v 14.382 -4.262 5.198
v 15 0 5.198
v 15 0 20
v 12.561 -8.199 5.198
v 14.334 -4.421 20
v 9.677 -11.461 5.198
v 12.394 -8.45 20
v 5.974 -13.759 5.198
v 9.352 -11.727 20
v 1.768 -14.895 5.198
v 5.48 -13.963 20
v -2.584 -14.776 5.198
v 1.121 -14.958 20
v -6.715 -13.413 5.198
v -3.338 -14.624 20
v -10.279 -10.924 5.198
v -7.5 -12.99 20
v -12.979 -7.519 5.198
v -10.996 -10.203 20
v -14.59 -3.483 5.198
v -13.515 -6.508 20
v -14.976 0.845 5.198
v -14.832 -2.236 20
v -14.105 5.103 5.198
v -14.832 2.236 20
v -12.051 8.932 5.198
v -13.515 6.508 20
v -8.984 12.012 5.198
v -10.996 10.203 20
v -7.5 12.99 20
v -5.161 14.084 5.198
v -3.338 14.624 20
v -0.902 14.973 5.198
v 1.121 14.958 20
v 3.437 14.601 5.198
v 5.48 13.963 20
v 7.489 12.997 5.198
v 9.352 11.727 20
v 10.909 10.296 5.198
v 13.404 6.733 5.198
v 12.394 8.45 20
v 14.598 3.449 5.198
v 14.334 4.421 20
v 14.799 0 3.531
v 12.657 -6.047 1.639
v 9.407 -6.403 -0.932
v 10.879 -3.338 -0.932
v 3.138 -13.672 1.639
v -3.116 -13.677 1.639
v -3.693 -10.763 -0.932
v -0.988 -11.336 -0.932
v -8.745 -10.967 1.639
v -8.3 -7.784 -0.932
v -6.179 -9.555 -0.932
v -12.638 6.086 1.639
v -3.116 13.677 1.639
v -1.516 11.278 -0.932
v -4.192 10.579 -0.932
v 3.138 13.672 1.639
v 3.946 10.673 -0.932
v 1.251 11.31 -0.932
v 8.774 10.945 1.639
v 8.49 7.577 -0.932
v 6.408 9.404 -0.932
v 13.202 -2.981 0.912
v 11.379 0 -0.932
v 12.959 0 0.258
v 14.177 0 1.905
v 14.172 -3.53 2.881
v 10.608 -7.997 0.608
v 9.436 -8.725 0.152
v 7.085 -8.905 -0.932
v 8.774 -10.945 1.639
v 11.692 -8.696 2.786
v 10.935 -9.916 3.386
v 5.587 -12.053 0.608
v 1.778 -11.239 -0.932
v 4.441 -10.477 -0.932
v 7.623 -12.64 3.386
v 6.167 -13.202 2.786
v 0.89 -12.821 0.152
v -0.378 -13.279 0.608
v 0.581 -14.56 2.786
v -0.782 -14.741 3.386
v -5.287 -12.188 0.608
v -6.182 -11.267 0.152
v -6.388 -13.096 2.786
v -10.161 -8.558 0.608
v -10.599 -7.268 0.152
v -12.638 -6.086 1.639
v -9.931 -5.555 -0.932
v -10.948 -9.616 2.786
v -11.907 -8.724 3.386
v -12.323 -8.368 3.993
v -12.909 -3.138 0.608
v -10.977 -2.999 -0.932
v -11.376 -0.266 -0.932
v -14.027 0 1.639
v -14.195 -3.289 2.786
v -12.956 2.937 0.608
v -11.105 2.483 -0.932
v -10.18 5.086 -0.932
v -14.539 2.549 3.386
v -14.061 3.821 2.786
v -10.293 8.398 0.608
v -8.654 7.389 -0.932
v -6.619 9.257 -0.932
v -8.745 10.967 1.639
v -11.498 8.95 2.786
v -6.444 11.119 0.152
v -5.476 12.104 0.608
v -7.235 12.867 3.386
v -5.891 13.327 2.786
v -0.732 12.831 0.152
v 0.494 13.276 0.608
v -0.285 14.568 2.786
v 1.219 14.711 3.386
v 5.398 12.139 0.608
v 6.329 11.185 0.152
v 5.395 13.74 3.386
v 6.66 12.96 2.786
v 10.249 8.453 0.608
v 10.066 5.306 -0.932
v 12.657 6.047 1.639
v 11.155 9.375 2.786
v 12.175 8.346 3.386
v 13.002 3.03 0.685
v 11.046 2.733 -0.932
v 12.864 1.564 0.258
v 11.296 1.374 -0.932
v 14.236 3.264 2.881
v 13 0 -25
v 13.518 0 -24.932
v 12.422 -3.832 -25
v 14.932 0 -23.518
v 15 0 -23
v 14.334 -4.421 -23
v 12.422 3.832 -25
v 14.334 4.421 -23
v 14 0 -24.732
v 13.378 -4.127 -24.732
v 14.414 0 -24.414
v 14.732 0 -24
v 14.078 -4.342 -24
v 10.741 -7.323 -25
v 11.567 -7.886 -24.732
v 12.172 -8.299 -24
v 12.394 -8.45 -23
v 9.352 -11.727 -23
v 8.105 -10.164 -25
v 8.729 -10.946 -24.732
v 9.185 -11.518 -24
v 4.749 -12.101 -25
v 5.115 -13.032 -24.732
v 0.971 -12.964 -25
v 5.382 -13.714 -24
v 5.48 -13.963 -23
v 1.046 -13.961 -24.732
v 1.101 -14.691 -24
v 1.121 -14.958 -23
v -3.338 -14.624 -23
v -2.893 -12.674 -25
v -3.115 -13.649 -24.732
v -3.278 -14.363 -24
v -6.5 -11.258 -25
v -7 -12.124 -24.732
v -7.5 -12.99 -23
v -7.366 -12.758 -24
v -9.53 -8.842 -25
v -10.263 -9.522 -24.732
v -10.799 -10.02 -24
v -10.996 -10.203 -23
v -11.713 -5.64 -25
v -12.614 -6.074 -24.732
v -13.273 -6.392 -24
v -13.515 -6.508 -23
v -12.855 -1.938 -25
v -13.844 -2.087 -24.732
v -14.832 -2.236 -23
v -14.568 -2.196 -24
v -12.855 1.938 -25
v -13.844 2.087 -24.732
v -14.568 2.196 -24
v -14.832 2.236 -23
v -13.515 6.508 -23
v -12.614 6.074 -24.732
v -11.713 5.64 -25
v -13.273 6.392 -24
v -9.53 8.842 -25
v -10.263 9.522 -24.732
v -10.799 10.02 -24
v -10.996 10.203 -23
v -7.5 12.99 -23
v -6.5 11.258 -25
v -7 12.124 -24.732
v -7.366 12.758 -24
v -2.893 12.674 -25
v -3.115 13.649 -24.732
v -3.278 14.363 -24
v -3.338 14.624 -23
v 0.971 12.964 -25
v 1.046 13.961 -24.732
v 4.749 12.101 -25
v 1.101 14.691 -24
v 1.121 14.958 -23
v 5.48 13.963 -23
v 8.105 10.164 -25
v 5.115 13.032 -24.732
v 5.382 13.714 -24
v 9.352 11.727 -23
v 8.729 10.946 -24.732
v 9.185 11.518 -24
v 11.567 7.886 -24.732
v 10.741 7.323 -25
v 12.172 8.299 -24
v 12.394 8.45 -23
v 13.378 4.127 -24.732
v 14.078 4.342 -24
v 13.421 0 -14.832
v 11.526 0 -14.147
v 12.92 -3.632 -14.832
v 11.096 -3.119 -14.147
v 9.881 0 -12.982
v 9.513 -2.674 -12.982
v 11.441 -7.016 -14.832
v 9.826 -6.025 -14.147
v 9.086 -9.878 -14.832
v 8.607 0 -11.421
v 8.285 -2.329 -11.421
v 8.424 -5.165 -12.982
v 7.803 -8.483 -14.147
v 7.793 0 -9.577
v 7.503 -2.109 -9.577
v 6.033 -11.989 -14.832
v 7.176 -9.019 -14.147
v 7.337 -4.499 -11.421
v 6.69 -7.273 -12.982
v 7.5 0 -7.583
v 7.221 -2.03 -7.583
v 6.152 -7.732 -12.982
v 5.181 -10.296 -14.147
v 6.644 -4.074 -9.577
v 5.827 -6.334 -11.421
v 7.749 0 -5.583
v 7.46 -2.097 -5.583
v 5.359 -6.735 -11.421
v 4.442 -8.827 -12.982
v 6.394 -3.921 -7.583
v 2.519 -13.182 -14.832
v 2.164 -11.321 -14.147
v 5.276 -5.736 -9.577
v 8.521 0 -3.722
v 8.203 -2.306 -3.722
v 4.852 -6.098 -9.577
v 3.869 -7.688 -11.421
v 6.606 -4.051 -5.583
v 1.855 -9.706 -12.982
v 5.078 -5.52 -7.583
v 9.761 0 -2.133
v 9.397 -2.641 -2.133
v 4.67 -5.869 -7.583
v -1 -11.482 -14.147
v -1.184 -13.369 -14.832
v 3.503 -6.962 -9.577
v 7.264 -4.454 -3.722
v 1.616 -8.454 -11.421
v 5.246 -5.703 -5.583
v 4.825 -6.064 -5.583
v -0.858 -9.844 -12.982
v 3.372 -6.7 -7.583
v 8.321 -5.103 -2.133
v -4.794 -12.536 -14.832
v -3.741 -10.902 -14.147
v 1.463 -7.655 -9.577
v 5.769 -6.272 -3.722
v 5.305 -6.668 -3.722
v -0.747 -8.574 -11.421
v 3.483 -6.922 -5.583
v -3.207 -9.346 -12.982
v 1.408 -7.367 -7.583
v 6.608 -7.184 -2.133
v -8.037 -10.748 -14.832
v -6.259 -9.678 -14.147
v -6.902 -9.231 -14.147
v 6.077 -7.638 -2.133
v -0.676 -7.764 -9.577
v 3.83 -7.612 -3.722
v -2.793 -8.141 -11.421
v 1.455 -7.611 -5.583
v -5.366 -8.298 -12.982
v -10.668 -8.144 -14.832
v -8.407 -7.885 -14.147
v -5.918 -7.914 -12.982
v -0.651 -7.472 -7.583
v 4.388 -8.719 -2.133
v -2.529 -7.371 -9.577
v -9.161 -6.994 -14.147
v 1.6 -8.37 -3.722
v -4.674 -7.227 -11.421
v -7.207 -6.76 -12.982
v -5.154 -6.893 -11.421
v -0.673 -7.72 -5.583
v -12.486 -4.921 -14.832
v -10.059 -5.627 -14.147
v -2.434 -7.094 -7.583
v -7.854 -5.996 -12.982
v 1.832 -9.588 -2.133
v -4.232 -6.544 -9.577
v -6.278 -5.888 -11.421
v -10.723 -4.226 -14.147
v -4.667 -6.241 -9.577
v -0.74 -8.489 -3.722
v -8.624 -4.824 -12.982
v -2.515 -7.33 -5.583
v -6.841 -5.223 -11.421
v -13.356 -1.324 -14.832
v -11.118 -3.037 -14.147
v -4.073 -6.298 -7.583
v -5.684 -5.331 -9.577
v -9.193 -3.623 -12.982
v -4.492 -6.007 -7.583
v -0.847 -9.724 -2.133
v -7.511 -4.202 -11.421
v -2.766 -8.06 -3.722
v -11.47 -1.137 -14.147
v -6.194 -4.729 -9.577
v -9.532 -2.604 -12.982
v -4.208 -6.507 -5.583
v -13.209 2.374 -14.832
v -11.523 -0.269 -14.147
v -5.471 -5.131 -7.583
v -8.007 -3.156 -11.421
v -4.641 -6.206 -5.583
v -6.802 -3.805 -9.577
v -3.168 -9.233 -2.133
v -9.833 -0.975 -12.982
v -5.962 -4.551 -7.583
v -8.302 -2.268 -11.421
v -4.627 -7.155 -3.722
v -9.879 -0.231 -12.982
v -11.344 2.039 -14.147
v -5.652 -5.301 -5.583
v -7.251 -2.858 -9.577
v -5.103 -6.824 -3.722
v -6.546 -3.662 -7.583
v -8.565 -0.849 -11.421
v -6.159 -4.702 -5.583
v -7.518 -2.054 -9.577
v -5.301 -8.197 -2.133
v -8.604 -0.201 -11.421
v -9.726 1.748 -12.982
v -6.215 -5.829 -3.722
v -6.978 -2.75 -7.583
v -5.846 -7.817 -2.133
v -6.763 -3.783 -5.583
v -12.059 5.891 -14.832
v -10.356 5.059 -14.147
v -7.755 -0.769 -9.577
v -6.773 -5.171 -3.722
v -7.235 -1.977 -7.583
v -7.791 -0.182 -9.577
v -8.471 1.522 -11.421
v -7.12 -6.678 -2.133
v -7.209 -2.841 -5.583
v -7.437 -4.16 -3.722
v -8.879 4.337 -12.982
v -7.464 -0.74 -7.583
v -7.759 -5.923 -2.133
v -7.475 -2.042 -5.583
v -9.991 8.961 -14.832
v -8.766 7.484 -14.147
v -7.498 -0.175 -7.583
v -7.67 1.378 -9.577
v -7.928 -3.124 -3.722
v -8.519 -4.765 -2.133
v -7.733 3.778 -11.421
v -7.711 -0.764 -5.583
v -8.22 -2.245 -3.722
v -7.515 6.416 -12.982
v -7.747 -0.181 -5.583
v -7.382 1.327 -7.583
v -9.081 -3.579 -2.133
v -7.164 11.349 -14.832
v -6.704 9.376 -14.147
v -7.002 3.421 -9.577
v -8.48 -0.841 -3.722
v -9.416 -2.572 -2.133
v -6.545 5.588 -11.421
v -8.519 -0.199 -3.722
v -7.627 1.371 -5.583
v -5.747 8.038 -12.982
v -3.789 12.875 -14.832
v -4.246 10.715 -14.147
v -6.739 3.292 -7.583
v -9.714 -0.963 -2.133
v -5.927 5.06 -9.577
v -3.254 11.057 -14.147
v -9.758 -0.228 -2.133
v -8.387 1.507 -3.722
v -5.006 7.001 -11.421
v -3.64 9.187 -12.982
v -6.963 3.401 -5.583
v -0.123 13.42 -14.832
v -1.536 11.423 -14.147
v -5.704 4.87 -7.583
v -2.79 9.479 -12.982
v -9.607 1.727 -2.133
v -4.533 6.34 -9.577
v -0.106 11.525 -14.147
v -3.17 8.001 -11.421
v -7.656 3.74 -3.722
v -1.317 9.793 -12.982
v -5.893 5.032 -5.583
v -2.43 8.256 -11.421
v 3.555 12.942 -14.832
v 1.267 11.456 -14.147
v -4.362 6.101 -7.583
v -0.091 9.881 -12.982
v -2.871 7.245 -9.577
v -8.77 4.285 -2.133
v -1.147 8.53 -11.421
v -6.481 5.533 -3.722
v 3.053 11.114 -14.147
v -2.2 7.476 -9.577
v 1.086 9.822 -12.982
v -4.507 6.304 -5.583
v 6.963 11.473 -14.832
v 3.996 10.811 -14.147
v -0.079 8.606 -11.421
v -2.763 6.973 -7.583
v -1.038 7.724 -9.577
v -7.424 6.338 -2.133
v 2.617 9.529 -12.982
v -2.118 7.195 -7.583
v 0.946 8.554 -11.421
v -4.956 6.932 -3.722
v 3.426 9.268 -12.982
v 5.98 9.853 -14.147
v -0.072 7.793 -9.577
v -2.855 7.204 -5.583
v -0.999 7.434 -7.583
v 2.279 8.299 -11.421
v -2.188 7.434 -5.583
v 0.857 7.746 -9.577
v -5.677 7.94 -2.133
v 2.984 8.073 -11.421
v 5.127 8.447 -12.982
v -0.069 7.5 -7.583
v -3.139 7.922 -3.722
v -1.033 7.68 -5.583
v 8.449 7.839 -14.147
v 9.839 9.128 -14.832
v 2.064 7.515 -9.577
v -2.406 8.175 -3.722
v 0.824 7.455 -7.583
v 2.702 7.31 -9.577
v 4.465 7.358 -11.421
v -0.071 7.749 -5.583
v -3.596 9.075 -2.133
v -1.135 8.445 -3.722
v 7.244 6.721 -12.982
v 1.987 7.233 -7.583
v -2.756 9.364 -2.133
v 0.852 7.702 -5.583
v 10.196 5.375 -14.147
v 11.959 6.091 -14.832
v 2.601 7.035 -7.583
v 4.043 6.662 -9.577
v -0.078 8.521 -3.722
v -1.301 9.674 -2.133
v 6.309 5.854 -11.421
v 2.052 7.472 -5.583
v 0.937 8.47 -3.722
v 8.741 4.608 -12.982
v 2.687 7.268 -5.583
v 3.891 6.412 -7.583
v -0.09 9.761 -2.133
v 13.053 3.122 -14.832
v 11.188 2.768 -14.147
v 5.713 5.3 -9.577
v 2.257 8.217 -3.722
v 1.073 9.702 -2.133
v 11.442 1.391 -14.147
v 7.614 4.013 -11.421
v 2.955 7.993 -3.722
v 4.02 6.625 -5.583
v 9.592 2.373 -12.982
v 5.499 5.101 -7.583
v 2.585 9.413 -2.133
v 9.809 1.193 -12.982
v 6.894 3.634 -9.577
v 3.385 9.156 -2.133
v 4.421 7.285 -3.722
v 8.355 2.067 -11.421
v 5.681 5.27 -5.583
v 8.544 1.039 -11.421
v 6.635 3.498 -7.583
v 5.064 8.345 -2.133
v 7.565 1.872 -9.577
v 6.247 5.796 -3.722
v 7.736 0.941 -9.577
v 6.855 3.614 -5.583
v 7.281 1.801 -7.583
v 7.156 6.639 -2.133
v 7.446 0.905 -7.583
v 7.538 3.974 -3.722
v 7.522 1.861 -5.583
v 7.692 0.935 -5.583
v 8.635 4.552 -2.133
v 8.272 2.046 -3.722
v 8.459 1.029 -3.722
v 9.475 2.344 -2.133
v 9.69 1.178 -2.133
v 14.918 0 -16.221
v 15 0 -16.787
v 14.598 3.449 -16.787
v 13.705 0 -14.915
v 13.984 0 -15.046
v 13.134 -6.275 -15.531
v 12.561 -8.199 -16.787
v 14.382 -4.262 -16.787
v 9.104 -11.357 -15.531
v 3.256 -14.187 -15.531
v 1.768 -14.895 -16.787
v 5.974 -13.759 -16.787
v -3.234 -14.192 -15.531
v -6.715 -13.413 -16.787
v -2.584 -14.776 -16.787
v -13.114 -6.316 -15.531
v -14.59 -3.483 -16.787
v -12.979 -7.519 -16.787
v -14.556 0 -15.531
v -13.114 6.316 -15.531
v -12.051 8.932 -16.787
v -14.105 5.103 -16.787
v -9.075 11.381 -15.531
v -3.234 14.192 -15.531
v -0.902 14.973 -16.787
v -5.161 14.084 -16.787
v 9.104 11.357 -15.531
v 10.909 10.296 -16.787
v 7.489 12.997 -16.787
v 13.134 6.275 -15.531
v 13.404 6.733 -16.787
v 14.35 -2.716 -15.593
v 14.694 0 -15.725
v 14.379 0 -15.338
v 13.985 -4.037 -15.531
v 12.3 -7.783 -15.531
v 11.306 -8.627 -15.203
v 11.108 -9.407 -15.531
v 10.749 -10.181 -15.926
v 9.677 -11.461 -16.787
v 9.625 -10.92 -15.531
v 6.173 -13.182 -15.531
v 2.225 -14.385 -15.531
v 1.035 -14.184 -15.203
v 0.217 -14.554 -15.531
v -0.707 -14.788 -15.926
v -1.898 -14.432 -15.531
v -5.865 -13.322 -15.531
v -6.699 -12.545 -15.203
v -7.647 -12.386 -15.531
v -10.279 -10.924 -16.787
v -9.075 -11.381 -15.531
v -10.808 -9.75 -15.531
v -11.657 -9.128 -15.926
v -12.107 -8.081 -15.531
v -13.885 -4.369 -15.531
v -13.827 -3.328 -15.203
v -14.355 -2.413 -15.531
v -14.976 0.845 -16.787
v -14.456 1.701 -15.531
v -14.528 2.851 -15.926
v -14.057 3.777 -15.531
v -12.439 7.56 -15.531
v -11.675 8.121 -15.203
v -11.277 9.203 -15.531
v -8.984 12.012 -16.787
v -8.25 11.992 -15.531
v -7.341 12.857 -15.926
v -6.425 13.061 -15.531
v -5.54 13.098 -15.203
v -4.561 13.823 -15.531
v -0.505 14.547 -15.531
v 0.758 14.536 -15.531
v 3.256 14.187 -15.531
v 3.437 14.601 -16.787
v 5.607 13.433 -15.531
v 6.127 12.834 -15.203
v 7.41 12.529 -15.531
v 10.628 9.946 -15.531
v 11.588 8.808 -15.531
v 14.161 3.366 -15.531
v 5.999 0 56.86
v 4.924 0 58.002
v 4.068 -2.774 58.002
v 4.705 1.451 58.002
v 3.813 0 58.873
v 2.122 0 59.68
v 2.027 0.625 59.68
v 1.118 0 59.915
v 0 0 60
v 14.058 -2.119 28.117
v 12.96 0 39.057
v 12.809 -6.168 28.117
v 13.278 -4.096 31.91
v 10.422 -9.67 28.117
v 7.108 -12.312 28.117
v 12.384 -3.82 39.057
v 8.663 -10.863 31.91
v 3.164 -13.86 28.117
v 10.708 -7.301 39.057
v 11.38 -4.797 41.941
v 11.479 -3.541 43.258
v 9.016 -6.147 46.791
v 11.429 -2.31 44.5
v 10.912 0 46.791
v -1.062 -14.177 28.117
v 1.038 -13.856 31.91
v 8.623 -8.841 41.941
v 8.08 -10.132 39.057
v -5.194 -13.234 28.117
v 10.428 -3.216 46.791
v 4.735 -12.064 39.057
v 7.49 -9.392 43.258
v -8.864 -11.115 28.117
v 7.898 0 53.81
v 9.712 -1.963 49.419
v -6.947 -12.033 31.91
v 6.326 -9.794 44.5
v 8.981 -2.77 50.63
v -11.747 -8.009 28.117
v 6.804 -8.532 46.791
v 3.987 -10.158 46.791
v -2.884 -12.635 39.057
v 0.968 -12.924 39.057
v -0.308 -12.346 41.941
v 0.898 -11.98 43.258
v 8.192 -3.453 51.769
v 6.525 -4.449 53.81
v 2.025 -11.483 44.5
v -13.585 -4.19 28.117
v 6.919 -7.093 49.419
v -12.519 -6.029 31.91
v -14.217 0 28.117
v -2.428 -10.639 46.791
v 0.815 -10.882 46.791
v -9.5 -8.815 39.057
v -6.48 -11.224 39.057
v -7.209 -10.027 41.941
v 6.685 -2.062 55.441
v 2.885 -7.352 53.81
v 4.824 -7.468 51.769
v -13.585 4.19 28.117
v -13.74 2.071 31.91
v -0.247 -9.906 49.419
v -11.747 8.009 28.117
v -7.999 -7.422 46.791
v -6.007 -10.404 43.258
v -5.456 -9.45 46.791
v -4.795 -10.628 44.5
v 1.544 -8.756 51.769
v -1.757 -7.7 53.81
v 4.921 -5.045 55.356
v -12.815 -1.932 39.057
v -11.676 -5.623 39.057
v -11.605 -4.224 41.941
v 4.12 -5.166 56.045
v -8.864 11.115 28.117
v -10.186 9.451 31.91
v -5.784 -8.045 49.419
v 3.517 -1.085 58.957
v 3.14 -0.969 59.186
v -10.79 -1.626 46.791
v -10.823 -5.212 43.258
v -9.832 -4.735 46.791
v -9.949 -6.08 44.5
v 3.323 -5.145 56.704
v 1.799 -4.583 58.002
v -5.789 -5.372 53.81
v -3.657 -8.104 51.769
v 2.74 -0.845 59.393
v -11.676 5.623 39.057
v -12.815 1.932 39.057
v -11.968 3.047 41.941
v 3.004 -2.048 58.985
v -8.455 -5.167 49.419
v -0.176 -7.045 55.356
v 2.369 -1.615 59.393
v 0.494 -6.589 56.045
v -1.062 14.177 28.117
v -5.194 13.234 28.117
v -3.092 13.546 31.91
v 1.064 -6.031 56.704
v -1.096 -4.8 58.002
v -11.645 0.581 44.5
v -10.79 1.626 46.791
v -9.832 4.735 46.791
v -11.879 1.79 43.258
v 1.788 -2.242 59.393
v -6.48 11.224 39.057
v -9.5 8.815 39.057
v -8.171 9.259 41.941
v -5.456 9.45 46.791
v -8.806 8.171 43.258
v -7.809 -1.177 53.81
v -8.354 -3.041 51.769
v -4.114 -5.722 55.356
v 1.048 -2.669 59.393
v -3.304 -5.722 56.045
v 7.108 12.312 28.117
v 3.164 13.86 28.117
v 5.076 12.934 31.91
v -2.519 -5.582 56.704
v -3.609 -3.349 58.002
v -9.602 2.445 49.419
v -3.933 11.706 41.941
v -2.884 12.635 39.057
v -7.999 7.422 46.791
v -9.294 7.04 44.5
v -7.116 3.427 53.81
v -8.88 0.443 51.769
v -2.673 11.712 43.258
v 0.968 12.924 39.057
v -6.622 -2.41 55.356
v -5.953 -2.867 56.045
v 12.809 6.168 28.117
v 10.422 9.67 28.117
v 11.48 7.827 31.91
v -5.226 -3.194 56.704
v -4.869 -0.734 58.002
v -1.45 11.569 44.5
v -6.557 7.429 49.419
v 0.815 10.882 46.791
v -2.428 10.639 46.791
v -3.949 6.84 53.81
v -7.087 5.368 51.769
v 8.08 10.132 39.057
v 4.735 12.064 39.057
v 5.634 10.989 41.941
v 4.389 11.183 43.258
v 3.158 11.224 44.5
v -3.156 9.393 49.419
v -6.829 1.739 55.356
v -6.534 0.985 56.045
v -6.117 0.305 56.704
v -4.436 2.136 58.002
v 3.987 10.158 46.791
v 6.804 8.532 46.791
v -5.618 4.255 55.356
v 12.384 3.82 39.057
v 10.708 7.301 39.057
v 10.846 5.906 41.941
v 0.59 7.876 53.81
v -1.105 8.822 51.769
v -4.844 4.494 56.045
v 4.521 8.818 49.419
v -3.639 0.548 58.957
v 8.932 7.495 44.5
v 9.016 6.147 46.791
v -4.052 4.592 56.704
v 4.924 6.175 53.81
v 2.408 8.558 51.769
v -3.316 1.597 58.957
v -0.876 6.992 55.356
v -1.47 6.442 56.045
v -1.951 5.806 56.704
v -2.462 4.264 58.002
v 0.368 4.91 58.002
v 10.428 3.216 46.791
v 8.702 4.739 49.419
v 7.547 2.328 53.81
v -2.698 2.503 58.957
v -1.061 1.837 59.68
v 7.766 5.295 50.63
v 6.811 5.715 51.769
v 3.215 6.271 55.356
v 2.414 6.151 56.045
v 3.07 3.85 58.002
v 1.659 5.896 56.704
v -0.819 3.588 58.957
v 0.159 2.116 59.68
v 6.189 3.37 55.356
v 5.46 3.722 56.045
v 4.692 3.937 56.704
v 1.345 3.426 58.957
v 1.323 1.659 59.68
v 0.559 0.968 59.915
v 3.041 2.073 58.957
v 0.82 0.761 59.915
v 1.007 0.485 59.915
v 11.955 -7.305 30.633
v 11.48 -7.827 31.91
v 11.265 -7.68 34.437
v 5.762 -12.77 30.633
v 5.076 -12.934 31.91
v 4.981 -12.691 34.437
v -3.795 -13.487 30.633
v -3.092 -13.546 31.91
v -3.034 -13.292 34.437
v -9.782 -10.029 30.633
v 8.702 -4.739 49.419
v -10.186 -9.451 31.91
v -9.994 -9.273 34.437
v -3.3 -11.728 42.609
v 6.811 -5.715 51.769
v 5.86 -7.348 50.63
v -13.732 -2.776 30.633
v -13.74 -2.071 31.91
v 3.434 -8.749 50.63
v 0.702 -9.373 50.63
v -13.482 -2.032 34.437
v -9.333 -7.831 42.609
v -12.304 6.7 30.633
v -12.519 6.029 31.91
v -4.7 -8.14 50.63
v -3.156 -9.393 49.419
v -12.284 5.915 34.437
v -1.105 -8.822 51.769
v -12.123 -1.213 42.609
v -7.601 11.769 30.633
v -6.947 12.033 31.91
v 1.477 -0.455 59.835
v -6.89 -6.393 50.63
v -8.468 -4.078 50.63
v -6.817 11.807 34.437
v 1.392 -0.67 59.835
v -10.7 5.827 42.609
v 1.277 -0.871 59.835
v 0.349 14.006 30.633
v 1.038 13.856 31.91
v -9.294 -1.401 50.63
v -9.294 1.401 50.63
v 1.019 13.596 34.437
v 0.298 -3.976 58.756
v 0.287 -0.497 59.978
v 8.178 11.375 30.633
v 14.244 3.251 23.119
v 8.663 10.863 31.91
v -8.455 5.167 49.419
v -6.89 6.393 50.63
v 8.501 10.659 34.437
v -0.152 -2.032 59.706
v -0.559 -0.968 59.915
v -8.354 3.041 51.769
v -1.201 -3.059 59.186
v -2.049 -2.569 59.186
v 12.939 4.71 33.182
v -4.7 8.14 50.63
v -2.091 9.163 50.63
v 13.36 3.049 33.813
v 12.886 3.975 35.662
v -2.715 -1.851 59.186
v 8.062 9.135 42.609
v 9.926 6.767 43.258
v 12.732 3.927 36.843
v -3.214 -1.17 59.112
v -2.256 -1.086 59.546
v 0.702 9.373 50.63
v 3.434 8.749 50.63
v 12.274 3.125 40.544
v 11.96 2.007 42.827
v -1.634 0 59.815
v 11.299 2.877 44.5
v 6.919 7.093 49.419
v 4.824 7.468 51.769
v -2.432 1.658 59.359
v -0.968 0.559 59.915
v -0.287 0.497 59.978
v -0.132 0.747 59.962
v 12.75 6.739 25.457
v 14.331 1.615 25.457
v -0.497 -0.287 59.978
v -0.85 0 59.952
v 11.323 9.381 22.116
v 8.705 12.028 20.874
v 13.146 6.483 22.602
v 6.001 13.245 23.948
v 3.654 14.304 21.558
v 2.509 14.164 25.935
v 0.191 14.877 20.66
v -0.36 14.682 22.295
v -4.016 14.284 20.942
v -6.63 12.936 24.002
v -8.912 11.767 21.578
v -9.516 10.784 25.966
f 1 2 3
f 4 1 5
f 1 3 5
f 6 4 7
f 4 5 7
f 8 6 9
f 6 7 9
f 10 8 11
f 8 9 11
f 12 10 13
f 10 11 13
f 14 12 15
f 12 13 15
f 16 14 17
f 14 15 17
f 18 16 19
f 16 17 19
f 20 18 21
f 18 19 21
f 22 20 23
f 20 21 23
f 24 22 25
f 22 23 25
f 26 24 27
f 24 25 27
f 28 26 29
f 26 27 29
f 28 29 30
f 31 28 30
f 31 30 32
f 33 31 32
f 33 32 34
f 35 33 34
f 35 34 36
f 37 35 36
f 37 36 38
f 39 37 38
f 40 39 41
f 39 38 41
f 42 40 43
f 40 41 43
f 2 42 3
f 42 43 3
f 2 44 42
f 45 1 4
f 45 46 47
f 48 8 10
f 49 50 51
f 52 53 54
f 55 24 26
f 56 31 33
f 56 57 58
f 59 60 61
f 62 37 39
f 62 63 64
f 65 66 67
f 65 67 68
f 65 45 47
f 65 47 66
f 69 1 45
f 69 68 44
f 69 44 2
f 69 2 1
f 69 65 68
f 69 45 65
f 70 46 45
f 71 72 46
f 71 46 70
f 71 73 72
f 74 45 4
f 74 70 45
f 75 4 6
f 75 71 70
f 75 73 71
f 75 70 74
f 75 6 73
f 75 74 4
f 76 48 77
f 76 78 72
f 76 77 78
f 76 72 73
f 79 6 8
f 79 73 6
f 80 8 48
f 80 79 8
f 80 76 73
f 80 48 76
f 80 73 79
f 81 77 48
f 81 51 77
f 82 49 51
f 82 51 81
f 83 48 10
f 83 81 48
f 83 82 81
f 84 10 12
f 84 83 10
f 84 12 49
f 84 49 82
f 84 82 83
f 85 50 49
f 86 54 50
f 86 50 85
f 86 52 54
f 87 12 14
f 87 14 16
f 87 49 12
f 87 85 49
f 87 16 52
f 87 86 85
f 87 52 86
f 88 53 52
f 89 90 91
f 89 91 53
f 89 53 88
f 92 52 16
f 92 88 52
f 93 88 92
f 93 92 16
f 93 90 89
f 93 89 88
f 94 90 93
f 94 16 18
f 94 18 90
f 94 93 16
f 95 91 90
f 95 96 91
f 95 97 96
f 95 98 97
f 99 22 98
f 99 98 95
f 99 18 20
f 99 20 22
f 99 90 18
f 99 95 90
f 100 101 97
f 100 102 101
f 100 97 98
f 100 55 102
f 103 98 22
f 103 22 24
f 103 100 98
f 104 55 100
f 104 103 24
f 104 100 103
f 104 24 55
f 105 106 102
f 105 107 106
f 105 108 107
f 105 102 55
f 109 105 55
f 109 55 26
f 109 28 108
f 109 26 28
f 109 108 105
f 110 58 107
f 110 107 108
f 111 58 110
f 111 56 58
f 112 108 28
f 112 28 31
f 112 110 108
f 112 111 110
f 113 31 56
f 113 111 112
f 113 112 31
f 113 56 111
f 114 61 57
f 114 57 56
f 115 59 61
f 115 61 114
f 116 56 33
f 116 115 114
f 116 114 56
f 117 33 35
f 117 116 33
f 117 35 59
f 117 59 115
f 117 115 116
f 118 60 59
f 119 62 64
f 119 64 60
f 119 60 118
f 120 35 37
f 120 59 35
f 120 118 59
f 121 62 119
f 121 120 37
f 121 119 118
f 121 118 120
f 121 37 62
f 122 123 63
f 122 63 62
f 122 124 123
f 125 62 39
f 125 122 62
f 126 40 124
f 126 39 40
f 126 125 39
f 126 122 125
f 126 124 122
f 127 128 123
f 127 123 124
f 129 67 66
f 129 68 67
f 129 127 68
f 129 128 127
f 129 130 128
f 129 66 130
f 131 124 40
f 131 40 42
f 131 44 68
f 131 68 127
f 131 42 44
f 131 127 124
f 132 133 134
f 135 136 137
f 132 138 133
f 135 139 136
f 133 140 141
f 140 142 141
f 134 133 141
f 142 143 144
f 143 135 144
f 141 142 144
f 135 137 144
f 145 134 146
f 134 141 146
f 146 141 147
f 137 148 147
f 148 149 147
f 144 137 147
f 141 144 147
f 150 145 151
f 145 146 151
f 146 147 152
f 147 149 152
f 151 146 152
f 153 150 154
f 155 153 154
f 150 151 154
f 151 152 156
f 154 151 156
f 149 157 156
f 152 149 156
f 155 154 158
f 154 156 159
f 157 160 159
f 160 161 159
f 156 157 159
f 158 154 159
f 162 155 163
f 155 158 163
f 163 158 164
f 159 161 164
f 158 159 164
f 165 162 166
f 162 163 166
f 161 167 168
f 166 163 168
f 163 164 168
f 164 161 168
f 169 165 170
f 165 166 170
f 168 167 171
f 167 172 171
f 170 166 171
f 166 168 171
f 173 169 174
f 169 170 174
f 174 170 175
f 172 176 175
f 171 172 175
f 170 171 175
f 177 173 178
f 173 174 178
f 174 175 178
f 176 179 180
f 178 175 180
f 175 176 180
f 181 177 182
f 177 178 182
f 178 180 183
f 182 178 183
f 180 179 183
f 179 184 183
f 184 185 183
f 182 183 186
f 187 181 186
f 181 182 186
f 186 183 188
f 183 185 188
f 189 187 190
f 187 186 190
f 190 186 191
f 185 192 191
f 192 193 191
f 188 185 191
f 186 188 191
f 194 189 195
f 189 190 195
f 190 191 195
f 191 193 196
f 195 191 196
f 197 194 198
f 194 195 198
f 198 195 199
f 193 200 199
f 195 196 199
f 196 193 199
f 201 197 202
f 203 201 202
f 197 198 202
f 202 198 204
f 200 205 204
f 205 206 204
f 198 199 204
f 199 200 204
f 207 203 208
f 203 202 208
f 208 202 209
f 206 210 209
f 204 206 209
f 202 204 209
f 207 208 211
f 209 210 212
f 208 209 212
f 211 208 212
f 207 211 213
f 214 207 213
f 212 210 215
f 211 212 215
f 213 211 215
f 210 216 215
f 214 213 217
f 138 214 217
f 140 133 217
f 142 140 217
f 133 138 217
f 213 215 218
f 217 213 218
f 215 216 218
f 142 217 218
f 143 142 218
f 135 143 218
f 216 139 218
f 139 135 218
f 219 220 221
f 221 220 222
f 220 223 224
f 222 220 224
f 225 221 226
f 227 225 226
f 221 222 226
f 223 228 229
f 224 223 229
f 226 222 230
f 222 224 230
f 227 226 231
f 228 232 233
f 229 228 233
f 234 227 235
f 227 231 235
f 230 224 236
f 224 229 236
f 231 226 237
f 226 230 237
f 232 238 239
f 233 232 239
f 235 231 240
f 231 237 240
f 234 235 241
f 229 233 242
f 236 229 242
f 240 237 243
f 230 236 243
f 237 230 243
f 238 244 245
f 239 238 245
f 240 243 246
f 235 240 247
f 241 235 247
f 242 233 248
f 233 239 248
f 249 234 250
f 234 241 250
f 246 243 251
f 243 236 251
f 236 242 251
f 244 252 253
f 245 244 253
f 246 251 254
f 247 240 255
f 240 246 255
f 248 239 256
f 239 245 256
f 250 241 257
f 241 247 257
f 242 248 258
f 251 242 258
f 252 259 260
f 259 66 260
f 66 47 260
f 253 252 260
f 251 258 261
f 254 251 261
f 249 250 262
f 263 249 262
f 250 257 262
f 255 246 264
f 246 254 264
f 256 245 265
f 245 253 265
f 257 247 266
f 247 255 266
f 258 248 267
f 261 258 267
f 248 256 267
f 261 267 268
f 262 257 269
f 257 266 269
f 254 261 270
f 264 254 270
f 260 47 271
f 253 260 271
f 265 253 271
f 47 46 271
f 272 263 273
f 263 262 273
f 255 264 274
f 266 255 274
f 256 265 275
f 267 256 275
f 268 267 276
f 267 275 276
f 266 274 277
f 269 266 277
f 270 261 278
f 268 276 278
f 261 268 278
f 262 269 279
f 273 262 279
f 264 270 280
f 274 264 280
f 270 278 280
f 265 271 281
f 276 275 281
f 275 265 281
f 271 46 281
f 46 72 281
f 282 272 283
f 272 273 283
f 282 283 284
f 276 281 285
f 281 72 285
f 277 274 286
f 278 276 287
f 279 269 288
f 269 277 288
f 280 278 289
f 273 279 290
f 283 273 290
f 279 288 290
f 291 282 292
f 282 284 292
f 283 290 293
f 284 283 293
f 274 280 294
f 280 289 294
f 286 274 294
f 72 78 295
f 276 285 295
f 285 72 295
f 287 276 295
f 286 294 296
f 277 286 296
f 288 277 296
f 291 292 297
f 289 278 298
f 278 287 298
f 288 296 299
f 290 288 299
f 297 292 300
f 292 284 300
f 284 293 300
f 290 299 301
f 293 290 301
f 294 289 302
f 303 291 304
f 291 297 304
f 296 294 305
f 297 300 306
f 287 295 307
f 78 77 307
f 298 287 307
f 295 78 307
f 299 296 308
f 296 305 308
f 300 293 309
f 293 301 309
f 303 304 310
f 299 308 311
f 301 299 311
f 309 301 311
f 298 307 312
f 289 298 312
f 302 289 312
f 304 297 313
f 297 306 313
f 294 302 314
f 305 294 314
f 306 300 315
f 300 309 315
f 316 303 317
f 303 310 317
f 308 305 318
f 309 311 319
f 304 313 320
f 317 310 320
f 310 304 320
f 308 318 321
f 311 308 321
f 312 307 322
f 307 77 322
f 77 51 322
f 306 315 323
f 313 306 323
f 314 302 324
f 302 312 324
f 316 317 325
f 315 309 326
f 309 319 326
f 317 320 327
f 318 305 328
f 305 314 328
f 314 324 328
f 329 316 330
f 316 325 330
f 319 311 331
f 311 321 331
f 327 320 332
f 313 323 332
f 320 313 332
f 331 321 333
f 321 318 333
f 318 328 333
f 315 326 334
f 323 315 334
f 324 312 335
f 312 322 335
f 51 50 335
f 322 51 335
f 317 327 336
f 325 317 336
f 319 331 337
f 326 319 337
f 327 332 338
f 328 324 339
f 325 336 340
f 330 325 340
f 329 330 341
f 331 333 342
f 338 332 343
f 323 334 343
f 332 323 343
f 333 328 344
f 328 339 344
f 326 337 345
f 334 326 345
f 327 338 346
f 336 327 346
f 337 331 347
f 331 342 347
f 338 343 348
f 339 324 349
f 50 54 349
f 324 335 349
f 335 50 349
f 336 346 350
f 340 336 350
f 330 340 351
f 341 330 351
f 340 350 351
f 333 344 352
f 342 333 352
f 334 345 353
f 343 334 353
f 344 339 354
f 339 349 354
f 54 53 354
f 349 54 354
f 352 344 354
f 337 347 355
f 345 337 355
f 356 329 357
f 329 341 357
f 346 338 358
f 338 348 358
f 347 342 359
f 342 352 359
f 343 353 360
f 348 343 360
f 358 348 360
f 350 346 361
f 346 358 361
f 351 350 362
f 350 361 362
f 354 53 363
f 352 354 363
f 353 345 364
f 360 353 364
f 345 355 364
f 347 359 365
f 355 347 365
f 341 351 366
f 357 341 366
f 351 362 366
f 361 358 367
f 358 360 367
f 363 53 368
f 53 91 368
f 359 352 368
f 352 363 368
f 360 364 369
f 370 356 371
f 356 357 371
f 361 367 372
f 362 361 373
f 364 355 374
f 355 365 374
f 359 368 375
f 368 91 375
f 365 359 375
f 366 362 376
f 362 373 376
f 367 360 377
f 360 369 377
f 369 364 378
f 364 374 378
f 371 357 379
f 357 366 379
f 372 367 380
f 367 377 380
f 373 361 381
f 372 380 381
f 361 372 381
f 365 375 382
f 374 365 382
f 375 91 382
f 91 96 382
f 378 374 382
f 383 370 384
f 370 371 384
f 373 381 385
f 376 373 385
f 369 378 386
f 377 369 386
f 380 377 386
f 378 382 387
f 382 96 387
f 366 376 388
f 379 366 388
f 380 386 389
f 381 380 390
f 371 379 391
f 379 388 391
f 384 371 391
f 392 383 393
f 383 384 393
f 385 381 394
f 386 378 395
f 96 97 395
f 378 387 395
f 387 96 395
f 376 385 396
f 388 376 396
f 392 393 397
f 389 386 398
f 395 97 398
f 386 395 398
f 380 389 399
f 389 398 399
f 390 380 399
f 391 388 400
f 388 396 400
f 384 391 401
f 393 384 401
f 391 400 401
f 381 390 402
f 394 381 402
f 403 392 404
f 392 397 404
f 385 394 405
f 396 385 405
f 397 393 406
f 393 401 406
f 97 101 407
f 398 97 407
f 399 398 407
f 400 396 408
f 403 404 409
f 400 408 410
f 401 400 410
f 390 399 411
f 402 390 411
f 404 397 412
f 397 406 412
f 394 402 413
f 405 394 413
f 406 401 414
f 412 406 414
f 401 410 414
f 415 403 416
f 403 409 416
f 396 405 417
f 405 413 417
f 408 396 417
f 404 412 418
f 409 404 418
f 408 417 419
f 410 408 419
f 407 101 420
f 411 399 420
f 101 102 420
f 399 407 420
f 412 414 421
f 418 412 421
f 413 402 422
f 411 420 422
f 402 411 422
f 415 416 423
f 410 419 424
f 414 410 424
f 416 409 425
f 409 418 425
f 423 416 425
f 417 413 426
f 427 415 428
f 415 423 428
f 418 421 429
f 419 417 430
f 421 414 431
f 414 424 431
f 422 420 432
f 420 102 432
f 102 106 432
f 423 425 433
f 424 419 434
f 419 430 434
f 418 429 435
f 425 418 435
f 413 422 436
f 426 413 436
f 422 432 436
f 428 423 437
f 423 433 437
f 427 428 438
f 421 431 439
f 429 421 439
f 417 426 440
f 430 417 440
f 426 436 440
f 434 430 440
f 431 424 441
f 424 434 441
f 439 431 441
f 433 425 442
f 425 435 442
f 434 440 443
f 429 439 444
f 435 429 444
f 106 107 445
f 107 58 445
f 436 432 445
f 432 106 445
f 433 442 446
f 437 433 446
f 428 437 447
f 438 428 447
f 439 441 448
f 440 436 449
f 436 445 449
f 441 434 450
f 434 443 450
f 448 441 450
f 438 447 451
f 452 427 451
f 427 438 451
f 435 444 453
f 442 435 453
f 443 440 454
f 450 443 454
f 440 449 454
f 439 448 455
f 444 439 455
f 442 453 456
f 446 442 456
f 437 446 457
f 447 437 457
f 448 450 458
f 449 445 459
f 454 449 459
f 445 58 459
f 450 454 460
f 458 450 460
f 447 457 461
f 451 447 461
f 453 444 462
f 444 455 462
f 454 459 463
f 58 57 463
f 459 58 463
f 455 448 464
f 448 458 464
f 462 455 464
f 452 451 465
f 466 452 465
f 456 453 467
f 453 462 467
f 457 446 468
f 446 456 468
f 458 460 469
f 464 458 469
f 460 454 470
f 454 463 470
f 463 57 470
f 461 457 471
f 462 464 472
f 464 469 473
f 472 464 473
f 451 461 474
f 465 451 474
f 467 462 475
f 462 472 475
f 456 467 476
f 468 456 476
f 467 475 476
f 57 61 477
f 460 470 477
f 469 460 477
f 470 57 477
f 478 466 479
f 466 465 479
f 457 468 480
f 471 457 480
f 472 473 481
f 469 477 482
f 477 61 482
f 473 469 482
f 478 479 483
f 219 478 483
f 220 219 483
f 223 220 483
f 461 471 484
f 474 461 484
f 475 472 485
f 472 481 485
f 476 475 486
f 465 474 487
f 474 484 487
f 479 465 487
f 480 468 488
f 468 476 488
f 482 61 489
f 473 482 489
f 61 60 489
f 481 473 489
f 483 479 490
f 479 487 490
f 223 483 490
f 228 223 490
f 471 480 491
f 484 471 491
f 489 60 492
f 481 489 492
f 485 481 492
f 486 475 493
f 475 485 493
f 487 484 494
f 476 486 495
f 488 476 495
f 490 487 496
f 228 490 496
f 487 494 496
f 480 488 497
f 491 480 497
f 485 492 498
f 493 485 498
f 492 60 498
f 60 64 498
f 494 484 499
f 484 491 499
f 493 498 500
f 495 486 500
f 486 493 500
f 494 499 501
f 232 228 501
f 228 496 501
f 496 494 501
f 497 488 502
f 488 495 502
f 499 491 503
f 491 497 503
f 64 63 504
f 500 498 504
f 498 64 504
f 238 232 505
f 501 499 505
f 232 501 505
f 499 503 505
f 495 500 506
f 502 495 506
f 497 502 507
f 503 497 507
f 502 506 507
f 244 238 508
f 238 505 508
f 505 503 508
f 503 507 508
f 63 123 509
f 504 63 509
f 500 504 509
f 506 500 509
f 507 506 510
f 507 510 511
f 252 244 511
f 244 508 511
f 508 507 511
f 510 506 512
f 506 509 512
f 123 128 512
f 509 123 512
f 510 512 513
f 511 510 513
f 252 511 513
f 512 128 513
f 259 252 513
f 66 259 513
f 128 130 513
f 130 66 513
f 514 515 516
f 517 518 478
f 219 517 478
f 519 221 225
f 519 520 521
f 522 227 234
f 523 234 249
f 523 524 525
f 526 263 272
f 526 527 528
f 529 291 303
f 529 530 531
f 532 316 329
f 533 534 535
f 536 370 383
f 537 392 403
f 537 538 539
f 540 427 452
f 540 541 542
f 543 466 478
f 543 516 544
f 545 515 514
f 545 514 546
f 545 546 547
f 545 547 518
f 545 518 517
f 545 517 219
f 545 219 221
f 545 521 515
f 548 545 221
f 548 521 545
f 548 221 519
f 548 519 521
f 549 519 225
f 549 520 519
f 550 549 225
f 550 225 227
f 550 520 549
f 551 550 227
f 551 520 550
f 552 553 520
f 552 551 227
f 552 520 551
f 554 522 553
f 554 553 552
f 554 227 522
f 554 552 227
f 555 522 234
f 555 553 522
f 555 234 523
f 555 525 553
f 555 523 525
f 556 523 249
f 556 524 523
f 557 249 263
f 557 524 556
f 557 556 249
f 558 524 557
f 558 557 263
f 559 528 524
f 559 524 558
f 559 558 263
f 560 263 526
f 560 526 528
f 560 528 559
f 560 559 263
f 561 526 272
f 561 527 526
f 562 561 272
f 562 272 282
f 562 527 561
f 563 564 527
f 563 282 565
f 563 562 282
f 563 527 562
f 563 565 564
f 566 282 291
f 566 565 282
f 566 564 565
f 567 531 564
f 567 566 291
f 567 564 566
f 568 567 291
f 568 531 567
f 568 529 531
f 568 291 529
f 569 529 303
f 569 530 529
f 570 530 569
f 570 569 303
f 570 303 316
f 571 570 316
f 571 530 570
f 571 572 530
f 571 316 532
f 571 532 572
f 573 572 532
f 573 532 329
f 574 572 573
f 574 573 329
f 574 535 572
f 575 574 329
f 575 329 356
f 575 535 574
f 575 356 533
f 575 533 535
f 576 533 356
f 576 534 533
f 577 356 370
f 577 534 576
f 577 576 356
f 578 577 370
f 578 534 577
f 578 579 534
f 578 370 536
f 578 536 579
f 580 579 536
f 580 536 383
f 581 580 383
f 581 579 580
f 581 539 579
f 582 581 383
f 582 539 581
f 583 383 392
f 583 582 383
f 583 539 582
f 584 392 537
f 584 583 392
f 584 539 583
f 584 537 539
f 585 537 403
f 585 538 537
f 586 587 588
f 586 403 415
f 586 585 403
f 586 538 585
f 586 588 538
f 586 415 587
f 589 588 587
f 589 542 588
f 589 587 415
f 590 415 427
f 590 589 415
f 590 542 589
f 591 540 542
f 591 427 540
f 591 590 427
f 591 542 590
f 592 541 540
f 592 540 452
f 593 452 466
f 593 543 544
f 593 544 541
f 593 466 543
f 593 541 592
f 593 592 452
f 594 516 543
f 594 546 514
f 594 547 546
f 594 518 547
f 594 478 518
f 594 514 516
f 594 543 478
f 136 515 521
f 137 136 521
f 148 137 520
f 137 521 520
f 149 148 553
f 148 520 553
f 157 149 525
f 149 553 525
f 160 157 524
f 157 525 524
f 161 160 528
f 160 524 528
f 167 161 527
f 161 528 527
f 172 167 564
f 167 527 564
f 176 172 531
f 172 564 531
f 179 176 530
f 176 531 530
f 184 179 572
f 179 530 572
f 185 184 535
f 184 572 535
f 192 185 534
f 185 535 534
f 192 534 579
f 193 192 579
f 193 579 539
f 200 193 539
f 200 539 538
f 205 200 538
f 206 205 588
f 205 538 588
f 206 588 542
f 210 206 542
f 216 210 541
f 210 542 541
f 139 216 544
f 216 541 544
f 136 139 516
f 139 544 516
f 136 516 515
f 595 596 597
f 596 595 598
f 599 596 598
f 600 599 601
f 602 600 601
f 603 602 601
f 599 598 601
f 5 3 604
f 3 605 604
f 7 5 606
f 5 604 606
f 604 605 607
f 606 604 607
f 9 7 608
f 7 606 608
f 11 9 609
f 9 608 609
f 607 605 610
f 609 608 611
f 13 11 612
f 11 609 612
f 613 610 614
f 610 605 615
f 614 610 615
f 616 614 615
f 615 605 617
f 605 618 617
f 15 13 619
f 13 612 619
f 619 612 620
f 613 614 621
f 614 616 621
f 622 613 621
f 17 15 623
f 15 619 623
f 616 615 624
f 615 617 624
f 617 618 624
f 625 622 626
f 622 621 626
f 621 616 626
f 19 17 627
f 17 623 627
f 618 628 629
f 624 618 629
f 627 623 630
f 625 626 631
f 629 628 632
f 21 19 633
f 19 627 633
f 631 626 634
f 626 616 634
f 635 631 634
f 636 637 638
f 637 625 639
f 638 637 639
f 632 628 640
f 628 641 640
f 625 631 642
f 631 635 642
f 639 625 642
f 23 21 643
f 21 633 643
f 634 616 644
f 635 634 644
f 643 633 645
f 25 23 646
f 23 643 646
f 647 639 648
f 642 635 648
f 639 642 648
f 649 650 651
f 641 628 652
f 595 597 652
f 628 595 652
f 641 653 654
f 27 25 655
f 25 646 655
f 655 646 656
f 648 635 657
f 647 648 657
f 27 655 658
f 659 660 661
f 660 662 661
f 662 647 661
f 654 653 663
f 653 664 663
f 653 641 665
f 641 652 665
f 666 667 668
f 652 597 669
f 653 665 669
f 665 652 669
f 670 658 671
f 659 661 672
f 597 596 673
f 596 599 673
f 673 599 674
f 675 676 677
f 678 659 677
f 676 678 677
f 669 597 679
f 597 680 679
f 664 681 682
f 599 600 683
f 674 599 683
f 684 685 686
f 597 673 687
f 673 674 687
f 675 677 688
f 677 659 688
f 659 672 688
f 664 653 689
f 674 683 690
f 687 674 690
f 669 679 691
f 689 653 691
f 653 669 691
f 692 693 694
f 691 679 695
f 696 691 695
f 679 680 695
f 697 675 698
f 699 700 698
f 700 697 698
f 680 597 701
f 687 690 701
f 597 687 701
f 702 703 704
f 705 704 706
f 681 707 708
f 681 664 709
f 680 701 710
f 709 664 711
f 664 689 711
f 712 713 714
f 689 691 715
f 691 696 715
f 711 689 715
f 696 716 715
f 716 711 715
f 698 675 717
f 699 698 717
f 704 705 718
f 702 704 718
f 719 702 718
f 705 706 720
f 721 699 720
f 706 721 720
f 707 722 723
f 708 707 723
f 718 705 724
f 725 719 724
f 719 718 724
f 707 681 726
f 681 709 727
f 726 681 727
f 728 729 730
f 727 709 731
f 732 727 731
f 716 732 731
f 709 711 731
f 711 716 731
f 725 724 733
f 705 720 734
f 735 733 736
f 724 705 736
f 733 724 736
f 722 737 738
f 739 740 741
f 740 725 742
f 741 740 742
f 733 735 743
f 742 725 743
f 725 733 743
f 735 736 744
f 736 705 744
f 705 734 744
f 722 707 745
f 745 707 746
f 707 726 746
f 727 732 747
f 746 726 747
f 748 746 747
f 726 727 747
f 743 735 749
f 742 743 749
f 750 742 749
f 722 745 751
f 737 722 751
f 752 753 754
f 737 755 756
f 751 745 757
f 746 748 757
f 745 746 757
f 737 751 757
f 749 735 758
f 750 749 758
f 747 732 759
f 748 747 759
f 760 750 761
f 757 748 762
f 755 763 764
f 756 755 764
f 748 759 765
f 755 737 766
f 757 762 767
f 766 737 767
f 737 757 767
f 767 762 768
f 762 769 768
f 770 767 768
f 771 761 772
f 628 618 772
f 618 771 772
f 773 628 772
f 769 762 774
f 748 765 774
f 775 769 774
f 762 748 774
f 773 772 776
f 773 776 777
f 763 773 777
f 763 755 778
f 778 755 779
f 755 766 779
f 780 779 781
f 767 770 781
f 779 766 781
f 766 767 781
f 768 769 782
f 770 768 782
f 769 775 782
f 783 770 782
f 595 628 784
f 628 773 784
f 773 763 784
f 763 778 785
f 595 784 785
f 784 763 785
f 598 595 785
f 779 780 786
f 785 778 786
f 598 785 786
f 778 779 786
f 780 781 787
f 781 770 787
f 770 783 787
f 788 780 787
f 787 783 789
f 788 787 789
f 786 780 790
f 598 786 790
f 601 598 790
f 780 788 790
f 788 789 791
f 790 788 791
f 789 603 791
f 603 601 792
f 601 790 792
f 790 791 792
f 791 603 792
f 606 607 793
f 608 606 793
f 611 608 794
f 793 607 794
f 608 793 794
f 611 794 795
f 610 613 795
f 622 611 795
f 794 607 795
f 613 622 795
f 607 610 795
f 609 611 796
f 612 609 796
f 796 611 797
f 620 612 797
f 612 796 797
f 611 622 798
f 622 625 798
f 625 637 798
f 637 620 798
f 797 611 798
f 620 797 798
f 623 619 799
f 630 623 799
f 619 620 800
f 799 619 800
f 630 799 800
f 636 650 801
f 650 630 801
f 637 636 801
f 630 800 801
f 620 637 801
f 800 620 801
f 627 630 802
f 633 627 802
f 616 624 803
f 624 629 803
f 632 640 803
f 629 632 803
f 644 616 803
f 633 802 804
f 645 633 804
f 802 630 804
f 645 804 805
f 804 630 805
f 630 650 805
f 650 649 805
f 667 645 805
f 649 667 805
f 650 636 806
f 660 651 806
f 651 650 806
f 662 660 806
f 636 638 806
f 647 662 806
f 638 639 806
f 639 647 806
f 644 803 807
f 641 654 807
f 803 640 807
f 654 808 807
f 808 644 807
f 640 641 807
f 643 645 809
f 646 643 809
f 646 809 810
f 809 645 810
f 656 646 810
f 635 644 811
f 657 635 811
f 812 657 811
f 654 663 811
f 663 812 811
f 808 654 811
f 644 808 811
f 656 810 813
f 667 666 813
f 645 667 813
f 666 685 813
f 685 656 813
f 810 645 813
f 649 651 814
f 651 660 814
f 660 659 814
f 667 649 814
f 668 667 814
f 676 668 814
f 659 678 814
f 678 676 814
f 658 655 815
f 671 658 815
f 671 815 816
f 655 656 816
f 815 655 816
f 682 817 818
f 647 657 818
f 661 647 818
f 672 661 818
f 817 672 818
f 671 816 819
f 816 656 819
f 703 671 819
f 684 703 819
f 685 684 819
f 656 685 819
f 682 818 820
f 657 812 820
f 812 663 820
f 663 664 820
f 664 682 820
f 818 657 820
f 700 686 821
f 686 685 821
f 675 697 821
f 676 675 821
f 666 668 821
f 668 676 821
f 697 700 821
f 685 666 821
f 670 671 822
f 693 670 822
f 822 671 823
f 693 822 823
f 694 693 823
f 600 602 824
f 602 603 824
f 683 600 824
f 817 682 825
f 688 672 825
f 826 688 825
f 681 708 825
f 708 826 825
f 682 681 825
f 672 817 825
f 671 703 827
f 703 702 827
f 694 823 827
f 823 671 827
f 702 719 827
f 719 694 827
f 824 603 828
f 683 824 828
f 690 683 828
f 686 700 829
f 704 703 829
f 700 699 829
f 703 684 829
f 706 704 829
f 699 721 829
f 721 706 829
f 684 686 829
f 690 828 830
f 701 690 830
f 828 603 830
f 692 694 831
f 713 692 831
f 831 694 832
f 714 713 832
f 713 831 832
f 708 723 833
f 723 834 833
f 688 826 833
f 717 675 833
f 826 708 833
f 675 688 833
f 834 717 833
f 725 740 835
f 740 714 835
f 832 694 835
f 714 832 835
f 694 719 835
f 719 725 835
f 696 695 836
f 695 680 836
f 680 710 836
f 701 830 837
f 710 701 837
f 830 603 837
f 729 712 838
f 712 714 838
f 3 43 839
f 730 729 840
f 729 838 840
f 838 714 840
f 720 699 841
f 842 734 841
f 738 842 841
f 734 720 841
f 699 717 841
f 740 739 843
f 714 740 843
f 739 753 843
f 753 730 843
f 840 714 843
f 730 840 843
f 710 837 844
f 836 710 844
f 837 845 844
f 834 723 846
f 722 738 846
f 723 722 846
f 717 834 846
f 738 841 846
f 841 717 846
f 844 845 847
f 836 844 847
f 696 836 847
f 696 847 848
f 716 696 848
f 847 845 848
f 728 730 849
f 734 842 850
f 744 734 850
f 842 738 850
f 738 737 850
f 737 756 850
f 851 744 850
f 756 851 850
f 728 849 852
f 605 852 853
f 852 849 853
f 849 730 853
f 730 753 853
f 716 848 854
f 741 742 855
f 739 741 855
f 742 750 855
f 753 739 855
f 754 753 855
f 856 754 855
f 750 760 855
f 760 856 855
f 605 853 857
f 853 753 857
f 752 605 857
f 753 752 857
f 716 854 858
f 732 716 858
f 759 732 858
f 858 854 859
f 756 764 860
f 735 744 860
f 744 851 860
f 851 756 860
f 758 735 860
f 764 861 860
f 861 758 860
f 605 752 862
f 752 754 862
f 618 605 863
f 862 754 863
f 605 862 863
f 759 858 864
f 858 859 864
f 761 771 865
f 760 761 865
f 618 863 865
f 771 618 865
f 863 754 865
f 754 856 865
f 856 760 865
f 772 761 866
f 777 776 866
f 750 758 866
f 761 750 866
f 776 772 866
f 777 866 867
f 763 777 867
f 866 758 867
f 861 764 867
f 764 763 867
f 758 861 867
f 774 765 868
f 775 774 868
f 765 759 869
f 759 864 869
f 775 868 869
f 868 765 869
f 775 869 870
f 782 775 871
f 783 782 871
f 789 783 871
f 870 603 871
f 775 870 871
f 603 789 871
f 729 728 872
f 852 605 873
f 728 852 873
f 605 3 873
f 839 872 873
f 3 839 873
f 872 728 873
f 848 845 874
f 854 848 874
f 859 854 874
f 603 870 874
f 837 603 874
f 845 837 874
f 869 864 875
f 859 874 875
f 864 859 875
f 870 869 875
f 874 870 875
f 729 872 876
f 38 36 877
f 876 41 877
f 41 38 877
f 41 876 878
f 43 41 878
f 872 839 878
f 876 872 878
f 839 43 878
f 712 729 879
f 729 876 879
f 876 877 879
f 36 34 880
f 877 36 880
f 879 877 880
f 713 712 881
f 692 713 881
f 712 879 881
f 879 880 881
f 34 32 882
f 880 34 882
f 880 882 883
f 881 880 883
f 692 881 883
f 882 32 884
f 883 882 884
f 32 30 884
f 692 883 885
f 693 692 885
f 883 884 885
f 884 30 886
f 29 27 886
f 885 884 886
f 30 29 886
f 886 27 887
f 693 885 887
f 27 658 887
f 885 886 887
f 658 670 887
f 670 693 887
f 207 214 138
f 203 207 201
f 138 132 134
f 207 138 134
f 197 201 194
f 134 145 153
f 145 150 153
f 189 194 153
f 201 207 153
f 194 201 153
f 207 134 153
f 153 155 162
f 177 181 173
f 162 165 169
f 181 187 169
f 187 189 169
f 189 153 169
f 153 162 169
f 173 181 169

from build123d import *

# Parameters (mm, degrees)
F2_R = 2
F3_R = 7


with BuildPart() as f1:
    # F0 (on Front) → F1 (revolve)
    with BuildSketch(Plane.XZ):
        with BuildLine():
            Line((15, 0), (15, 20))
            add(Edge.make_bspline(
                [(15, 20), (14.5080885538, 22.063984506), (13.9999463782, 37.4930197538), (10.6078177215, 48.1757262572), (7.7037410613, 54.3763197541), (5.6345020381, 57.6882536536), (2.5841033515, 60), (0, 60)],
                knots=[0, 0, 0, 0, 0.2796626362, 0.525434394, 0.6977638983, 0.8311479045, 1, 1, 1, 1], degree=3))
            Line((0, 60), (0, -25))
            Line((0, -25), (15, -25))
            Line((15, -25), (15, -15))
            ThreePointArc((15, -15), (7.5, -7.5), (15, 0))
        make_face()
    revolve(axis=Axis((0, 0, 9.3989223242), (0, 0, -1)))

    # F2
    f2_edges = [f1.edges().sort_by_distance(p)[0] for p in [
        (-15, 0, -15),
        (-15, 0, -25),
    ]]
    fillet(f2_edges, radius=F2_R)

    # F3
    f3_edges = [f1.edges().sort_by_distance(p)[0] for p in [
        (-15, 0, 0),
    ]]
    fillet(f3_edges, radius=F3_R)


solid = f1.part
